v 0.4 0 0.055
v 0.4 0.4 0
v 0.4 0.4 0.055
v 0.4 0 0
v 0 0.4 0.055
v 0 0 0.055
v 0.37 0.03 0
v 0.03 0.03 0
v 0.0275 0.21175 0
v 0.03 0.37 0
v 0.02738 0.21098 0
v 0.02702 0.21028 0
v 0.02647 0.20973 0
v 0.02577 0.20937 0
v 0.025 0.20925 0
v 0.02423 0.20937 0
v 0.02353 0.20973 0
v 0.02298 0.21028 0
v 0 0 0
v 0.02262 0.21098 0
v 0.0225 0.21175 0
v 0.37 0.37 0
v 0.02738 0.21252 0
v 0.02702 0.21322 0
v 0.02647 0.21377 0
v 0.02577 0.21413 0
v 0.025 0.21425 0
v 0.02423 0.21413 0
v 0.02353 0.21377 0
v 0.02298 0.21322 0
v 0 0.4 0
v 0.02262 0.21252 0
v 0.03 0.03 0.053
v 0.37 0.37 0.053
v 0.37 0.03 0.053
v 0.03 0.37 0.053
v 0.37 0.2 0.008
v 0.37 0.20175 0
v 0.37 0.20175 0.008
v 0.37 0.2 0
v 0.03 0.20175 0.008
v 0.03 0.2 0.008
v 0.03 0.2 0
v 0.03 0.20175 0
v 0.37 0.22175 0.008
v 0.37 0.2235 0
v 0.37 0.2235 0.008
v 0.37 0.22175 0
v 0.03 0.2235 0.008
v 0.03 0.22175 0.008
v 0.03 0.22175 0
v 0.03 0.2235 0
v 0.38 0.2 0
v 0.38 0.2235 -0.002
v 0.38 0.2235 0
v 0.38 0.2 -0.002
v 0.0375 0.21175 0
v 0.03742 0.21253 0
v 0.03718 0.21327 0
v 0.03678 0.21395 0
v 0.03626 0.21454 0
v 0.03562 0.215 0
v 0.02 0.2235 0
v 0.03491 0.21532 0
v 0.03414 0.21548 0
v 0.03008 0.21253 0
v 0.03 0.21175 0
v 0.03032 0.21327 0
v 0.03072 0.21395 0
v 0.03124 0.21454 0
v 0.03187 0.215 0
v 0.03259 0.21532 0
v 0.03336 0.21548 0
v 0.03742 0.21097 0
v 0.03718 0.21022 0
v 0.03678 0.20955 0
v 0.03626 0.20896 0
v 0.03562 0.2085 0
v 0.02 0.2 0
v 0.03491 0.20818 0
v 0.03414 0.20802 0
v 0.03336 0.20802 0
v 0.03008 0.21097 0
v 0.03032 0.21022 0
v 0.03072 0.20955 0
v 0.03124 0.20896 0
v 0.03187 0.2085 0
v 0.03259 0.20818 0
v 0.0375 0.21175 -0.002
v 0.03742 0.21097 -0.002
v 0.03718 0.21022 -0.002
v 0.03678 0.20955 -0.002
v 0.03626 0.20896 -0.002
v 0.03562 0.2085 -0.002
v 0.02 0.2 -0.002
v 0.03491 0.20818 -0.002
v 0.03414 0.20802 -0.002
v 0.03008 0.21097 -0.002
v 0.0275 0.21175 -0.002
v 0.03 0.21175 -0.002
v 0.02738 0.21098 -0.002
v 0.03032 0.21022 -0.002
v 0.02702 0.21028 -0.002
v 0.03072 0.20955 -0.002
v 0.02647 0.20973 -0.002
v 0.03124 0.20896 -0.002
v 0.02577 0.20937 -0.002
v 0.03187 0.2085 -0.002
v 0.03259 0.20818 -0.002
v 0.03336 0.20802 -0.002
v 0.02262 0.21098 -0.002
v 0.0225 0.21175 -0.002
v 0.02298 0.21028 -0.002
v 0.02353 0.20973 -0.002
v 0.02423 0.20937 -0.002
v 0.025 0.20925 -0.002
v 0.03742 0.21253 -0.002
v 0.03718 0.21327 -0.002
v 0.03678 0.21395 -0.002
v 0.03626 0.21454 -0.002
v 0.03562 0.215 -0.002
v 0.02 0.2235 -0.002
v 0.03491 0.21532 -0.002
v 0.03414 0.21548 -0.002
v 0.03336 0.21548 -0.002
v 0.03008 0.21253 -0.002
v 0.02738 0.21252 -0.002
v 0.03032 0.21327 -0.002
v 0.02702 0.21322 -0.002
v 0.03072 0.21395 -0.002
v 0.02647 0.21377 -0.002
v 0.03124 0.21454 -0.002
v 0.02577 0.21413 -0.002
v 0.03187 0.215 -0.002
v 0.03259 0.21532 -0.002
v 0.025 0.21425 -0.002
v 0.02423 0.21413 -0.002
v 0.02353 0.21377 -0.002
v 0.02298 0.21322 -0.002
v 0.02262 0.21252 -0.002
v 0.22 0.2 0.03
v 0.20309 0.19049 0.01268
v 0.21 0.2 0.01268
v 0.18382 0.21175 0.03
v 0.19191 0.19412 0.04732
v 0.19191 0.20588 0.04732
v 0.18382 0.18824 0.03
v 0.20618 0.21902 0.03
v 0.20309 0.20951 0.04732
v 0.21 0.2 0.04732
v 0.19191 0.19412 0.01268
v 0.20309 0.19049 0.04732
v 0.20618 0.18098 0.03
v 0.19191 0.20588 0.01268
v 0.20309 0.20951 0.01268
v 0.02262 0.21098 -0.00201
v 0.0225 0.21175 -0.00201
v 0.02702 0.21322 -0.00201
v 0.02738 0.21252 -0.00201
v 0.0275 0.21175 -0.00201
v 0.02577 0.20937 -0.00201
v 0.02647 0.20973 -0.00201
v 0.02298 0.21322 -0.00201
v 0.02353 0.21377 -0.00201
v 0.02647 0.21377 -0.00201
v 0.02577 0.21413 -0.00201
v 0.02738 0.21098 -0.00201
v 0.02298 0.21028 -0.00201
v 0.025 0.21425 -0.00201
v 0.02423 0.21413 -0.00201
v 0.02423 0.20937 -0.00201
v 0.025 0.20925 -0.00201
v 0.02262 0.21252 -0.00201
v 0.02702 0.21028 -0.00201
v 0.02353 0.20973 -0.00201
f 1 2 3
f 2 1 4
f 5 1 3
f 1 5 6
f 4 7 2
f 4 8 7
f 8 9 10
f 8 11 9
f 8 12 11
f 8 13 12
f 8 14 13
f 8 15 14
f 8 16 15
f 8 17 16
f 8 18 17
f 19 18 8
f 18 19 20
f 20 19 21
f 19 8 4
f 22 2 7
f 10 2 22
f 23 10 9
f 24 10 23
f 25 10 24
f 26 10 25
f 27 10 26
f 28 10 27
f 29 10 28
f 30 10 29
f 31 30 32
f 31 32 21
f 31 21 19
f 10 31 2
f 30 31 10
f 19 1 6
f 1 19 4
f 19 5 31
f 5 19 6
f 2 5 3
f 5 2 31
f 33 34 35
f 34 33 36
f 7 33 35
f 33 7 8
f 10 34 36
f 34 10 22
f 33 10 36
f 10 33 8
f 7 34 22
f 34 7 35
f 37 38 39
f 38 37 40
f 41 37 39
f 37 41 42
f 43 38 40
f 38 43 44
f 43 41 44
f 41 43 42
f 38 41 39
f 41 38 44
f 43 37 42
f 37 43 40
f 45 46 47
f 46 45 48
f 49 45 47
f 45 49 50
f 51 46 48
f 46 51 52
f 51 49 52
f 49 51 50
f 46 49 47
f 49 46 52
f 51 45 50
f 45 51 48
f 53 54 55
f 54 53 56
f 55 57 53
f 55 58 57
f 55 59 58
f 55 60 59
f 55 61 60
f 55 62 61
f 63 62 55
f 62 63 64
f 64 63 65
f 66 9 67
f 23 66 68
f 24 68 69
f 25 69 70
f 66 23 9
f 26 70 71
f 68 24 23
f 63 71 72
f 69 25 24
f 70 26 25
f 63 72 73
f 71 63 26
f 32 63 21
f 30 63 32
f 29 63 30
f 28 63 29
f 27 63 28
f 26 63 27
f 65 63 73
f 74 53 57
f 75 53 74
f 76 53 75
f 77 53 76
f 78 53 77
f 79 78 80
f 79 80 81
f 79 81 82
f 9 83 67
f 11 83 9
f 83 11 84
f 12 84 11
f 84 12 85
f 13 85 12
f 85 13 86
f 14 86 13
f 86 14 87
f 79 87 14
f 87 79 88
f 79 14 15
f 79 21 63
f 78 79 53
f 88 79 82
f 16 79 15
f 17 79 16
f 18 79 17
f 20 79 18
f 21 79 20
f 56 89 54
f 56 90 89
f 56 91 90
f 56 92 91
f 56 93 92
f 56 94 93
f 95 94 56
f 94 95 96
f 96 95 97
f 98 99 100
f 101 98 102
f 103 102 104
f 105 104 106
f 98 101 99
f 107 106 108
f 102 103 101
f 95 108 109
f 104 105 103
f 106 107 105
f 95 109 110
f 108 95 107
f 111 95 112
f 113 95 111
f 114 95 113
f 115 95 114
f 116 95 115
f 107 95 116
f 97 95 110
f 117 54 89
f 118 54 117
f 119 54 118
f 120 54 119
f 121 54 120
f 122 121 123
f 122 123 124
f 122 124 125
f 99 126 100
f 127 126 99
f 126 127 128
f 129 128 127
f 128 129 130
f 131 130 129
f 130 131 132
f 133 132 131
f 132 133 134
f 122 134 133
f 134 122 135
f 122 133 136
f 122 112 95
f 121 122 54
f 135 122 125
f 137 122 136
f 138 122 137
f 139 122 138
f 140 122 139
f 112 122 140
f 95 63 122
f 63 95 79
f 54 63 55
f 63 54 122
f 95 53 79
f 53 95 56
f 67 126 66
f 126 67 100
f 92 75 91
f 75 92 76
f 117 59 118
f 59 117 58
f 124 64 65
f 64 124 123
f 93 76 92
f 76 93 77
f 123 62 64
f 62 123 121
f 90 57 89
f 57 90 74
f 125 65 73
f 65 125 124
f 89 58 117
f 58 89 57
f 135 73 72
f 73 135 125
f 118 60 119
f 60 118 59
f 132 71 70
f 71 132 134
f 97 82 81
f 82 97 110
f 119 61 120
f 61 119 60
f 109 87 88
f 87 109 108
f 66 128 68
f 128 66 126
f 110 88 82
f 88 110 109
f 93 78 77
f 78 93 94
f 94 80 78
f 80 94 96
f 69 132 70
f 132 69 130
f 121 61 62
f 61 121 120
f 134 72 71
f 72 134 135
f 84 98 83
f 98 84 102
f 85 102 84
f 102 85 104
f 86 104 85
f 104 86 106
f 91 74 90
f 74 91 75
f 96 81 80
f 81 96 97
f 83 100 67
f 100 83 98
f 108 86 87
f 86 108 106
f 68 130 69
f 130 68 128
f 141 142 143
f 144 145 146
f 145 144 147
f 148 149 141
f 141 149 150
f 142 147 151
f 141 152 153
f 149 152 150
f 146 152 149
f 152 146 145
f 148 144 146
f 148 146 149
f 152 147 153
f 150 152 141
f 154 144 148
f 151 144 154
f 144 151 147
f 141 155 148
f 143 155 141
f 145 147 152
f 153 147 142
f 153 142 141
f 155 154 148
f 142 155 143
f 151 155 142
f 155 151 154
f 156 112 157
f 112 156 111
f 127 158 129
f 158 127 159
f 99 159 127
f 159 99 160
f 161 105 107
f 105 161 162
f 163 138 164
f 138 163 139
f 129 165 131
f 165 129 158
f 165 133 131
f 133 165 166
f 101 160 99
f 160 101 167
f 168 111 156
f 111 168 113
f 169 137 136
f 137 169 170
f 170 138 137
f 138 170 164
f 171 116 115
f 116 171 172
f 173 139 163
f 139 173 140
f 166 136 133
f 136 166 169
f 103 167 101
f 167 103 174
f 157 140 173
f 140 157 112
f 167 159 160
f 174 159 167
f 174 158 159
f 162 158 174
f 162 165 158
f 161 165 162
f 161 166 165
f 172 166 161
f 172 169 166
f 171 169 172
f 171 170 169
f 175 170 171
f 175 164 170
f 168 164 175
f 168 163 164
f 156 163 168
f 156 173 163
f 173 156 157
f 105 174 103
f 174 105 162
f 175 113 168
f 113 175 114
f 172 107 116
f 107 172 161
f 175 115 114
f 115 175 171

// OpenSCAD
total_side = 0.4;
// from ceiling to the light
total_depth = 0.06;
// Spacing from ceiling for ventilation
ventilation_spacing = 0.005;
// outside frame depth
outside_depth = total_depth - ventilation_spacing;

// width of the visible frame bars
frame_width = 0.02;


glass_side = total_side - frame_width * 2;
glass_thickness = 0.002;
glass_mount_padding = 0.01;
inner_frame_side = glass_side - 2*glass_mount_padding;

// How thick the frame is in total, including the indented part
frame_width_bottom = frame_width + glass_mount_padding;

bottom_frame_depth = total_depth - ventilation_spacing - glass_thickness;

light_center_point = [total_side/2, total_side/2, total_depth/2];

// https://www.ledshopik.cz/led-profil-wide-up-x11727
led_container_width = 0.0235;
led_container_inner_width = 0.02;
led_container_bottom_thickness = 0.002;
led_container_height = 0.01;
// How far does the led container overlap to the frame of the lamp
led_container_overlap = 0.01;
// The container for leds should be shorter than the side of lamp
// margin applies on both sides.
led_container_length_margin = frame_width_bottom - led_container_overlap;
// how long should it be cut
led_container_total_len = total_side - 2*led_container_length_margin;
// How long the LED strip inside will be
led_container_led_len = led_container_total_len - 2*led_container_overlap;
// Hole to put the wires through
led_wire_hole_diameter = min(led_container_inner_width - 2*0.0015, 0.0075);
led_wire_hole_radius = led_wire_hole_diameter / 2;

module light_frame() {
    // Length of one of the bars of the frame, these are all same length
    frame_bar_length = total_side - frame_width;

    translate([frame_width,0,0])
    cube([frame_bar_length, frame_width, outside_depth], false);


    color("#CC9900")
    translate([frame_width,0,0])
    rotate(90)
    cube([frame_bar_length, frame_width, outside_depth], false);

    color("#CC9900")
    translate([total_side,frame_width,0])
    rotate(90)
    cube([frame_bar_length, frame_width, outside_depth], false);

    translate([0,total_side-frame_width,0])
    cube([frame_bar_length, frame_width, outside_depth], false);

    color("#AA3300")
    translate([frame_width, frame_width, 0]) 
    cube([glass_side, glass_mount_padding, outside_depth - glass_thickness]);

    color("#AA3300")
    translate([frame_width, total_side-frame_width-glass_mount_padding, 0]) 
    cube([glass_side, glass_mount_padding, outside_depth - glass_thickness]);

    shorter_glass_padding = glass_side-2*glass_mount_padding;

    color("#BB3300")
    translate([frame_width, frame_width+glass_mount_padding, 0]) 
    cube([glass_mount_padding, shorter_glass_padding, outside_depth - glass_thickness]);

    color("#BB3300")
    translate([total_side-frame_width-glass_mount_padding, frame_width+glass_mount_padding, 0]) 
    cube([glass_mount_padding, shorter_glass_padding, outside_depth - glass_thickness]);
    // Option B - shorter and longer lines
    // One is offset to match the other
    // color("red")
    // translate([0,frame_width,0])
    //     cube([frame_width,total_side - 2 * frame_width,outside_depth], false);
}

module glass_cover() {
    color("gray", 0.2)
    translate([frame_width, frame_width, total_depth-ventilation_spacing-glass_thickness])
    cube([glass_side, glass_side, glass_thickness]);
}

module led_container_extrusion(pos) {
    translate([led_container_length_margin,pos,-led_container_bottom_thickness]) {
        color("gray")
        cube([led_container_total_len, led_container_width, led_container_bottom_thickness]);
        wall_thickness = (led_container_width - led_container_inner_width)/2.0;
        // height but not including the bottom part that was already extruded
        wall_height_subts = led_container_height-led_container_bottom_thickness;

        color("pink")
        translate([led_container_overlap, 0, led_container_bottom_thickness]) {
            wall_vect = [led_container_led_len, wall_thickness, wall_height_subts];

            cube(wall_vect);
            translate([0,led_container_width - wall_thickness,0])
            cube(wall_vect);
        }
    }
}

module screw_hole_cylinder(pos, diameter, length) {
    translate([frame_width+glass_mount_padding/2, pos+led_container_width/2 ,-led_container_bottom_thickness-0.00001]) {
        cylinder(length, diameter/2, diameter/2, $fn = 20);
    }
}

module led_container_holes(pos) {
    difference() {
        led_container_extrusion(pos);
        // wire hole
        translate([frame_width_bottom + led_wire_hole_radius, pos+led_container_width/2 ,-0.1]) {
            cylinder(0.2, led_wire_hole_diameter/2, led_wire_hole_diameter/2, $fn = 30);
        }
    }
}

// pos is relative to the edge of the lamp
module led_strip(pos) {
    assert(pos < total_side - frame_width);
    led_container_holes(pos = pos);

}

translate(light_center_point) {
    sphere(0.02);
}

light_frame();
glass_cover();
led_strip(0.2);
screw_hole_cylinder(0.2, 0.005, 0.01);
// translate([frame_width+led_wire_hole_diameter+0.004, 0.2+led_container_width/2 ,-0.1]) {
//     cylinder(0.2, led_wire_hole_diameter/2, led_wire_hole_diameter/2, $fn = 30);
// }
// cube([total_side, frame_width, outside_depth], false);

//translate([0, total_side - frame_width,0])
//cube([total_side, frame_width, outside_depth], false);
